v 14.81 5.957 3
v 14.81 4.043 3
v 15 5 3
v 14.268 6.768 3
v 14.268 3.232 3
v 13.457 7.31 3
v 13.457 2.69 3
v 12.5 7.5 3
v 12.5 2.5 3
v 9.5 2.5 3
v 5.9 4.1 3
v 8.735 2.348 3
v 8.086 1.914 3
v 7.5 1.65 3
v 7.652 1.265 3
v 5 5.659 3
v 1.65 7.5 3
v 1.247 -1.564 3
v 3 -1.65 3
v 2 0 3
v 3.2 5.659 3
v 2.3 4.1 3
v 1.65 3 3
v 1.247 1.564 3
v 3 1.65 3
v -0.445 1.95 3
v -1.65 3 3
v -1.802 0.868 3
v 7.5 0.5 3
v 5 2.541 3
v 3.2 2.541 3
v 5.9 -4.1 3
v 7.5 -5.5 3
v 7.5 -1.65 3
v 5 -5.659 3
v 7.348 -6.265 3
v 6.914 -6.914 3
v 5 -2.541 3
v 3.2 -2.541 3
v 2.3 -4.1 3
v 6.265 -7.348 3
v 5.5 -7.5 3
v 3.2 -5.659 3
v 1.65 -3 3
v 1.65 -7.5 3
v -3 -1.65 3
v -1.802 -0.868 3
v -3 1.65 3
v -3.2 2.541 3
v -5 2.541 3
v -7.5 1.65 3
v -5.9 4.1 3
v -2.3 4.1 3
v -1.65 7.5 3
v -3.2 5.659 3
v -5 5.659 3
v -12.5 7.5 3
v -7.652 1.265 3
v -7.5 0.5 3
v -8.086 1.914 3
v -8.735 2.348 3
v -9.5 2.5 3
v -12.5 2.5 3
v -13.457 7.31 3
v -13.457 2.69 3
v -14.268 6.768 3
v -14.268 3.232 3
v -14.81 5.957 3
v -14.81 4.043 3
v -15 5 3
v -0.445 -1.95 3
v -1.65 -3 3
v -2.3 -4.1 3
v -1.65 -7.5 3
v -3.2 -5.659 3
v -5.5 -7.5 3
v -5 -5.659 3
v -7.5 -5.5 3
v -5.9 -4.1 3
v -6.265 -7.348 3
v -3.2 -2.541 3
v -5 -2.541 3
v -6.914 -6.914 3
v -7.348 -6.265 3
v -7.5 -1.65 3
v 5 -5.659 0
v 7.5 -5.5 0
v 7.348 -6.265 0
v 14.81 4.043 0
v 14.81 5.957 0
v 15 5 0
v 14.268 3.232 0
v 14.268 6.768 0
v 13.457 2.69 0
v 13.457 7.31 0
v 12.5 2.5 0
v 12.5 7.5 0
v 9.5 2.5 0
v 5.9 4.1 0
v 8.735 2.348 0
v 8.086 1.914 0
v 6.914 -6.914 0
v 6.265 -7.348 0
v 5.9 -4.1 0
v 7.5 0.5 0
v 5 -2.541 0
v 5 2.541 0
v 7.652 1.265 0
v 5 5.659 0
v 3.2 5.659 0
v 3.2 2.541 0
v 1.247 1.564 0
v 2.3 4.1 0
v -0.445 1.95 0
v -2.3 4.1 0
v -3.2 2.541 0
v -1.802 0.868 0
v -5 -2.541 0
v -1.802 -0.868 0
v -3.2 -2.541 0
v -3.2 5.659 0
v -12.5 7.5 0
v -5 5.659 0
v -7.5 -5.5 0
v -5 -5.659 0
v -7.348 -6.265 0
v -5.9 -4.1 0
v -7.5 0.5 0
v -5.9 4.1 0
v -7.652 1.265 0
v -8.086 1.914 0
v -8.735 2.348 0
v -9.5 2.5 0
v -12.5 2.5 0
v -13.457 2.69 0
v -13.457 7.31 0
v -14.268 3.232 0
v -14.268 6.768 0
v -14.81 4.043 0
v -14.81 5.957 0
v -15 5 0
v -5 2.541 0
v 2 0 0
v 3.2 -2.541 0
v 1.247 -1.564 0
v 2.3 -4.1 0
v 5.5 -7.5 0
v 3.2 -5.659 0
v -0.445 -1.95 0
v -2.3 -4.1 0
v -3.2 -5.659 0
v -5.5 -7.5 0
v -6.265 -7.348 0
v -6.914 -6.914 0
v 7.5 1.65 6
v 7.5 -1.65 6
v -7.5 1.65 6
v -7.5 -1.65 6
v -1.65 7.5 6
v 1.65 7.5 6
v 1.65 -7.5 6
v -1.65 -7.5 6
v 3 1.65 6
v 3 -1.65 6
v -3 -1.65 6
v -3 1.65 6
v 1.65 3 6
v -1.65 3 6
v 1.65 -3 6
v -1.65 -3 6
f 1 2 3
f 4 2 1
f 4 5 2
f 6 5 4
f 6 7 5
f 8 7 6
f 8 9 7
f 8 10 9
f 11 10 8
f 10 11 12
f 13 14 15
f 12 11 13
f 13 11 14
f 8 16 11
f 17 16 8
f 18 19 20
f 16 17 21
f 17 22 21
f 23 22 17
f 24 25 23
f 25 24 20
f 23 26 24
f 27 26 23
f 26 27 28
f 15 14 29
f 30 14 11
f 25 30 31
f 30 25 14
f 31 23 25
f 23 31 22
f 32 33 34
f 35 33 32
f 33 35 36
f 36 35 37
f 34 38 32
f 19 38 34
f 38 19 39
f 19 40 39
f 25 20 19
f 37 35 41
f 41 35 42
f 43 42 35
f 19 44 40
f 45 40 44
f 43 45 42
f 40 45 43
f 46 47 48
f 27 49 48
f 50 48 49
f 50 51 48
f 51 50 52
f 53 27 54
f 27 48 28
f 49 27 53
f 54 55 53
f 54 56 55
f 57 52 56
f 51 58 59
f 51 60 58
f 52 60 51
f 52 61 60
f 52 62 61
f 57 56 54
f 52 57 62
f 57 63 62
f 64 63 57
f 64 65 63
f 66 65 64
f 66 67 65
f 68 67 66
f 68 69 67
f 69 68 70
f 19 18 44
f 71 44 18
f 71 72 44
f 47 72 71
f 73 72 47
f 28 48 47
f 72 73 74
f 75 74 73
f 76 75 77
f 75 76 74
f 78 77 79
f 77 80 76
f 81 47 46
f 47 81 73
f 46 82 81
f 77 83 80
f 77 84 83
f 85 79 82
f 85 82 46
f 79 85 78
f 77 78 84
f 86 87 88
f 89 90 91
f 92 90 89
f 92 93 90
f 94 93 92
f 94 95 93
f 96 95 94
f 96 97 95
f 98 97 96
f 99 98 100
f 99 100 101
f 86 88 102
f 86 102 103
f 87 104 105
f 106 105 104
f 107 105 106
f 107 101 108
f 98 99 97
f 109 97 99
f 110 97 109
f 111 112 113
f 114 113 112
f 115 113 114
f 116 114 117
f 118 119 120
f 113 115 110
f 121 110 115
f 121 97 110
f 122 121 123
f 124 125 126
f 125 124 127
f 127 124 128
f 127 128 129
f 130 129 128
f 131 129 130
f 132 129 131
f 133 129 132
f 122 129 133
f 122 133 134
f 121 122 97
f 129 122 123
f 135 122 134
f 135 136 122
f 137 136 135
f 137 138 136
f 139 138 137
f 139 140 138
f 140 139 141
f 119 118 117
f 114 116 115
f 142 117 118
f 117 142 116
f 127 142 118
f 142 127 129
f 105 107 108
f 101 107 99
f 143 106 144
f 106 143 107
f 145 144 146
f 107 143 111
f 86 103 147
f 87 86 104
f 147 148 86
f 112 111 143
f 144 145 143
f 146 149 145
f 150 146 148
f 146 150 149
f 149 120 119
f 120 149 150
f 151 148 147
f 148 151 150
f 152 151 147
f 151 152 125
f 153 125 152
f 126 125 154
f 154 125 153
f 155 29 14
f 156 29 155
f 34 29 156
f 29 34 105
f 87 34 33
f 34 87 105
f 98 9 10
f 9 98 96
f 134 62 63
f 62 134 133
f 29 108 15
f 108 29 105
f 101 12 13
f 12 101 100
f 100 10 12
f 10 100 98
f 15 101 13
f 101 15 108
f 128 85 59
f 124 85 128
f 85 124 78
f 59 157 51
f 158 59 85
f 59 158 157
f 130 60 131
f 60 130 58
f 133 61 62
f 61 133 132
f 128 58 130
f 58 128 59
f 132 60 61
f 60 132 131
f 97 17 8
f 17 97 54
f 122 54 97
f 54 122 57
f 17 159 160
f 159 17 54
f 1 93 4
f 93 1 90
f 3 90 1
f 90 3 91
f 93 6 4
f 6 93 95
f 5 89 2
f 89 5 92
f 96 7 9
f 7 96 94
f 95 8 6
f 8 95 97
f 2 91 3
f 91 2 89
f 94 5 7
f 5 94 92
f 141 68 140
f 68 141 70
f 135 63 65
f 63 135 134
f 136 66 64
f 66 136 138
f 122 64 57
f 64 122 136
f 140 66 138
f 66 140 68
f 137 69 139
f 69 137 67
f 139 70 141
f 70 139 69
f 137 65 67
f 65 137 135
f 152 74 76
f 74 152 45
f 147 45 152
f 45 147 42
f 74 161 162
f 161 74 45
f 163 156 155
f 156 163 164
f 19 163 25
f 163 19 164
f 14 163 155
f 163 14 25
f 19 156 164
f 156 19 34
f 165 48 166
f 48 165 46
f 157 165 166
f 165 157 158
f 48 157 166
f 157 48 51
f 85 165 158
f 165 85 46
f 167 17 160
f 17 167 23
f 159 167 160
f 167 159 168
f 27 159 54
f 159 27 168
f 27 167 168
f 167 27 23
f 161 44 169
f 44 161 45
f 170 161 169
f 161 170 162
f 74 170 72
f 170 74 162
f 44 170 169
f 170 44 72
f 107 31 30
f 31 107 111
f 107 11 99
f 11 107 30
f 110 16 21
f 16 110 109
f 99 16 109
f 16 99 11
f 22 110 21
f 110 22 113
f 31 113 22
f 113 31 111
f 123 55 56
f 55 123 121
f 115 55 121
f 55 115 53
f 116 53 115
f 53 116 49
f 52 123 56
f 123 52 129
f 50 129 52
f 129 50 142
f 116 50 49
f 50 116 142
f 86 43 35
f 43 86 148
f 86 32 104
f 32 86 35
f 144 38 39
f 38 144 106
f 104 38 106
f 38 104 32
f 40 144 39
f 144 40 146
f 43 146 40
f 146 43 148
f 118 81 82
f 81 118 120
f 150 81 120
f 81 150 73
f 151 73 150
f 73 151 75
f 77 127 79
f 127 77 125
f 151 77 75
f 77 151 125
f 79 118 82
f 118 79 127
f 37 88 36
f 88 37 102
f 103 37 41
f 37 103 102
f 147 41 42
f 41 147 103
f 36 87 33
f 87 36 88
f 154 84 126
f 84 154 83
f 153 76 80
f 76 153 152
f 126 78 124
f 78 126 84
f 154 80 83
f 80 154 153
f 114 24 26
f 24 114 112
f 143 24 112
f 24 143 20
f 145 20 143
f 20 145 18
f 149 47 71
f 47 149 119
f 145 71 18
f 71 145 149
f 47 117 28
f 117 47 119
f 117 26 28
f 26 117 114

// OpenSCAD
//CUSTOMIZER VARIABLES

/* [Basic_Parameters] */

// end cap thickness, in mm
end_depth = 3.0;    // [1:0.1:10]

// slot tab depth, in mm
tab_length = 3.0;    // [2:0.1:20]

// foot length (can be zero), in mm
foot_length = 5.0;    // [0:1:20]

// foot height, in mm
foot_height = 5.0;    // [2:0.5:20]

// Bolt diameter (can be zero), in mm
bolt_diameter = 3.0;    // [0:0.1:20]

// fillet radius, in mm
fillet_radius = 2.0;    // [1:0.1:20]

// hole radius (can be zero), in mm
hole_radius = 1.8;    // [0:0.1:20]

// Openbeam slot diameter for tight fit, in mm
slot_diameter = 3.3;    // [2:0.1:20]

// Openbeam slot distance to edge for tight fit, in mm
tab_height = 4.5;    // [2:0.1:20]

// Openbeam size, in mm
openrail_size = 15;   // [10:50]

//CUSTOMIZER VARIABLES END


// Sanity checks
if( end_depth <= 0 || tab_length <= 0
    || openrail_size <= 0 || slot_diameter <= 0)
{
    echo("<B>Error: Missing important parameters</B>");
}


// z depth
main_depth= end_depth;
fillet_size= fillet_radius;


// our object, translated to be flat on xy plane for easy STL generation
translate([0,0,main_depth/2])
    end_cap();

module end_cap(){

    main_width= openrail_size;
    main_height= openrail_size;
    bolt_length= main_depth+tab_length+5;

    difference() {
      union() {
 
        // the main block
        cube([main_width,main_height,main_depth],center = true);

        // tabs to grip the rail
        tab_dist= main_width/2 - tab_height/2;
        tab_offset= main_depth/2 + tab_length/2;
        translate([tab_dist,0,tab_offset])
          cube([tab_height,slot_diameter,tab_length], center = true);
        translate([-tab_dist,0,tab_offset])
          cube([tab_height,slot_diameter,tab_length], center = true);
        translate([0,tab_dist,tab_offset])
          cube([slot_diameter,tab_height,tab_length], center = true);
        translate([0,-tab_dist,tab_offset])
          cube([slot_diameter,tab_height,tab_length], center = true);
 
        // side pieces to help stabilize the rail on a table
        if (foot_length > 0 && foot_height > 0) {
            translate([0,(main_height-foot_height)/2,0])
              cube([main_width+2*foot_length,foot_height,main_depth], center = true);
            translate([(main_width/2+foot_length),(main_height-foot_height)/2,-main_depth/2])
              cylinder(main_depth,foot_height/2,foot_height/2,$fn=16);
            translate([-(main_width/2+foot_length),(main_height-foot_height)/2,-main_depth/2])
              cylinder(main_depth,foot_height/2,foot_height/2,$fn=16);
              
            // hacky fillet for strength of foot joint
            difference() {
              translate([main_width/2+fillet_size/2,main_height/2-foot_height-fillet_size/2,0])
                cube([fillet_size,fillet_size,main_depth],center = true);
              translate([main_width/2+fillet_size,main_height/2-foot_height-fillet_size,-main_depth/2-1])
                cylinder(main_depth+2,fillet_size,fillet_size,$fn=16);
            }
            difference() {
              translate([-(main_width/2+fillet_size/2),main_height/2-foot_height-fillet_size/2,0])
                cube([fillet_size,fillet_size,main_depth],center = true);
              translate([-(main_width/2+fillet_size),main_height/2-foot_height-fillet_size,-main_depth/2-1])
                cylinder(main_depth+2,fillet_size,fillet_size,$fn=16);
            }
         }
      }

    // optional holes to reduce material usage, allow a little more give on tabs
    if (hole_radius > 0) {
       hole_offset = main_width/3 - hole_radius/2;
       translate([hole_offset,hole_offset,-3])
         cylinder(bolt_length,hole_radius,hole_radius);
       translate([-hole_offset,hole_offset,-3])
         cylinder(bolt_length,hole_radius,hole_radius);
       translate([hole_offset,-hole_offset,-3])
         cylinder(bolt_length,hole_radius,hole_radius);
       translate([-hole_offset,-hole_offset,-3])
         cylinder(bolt_length,hole_radius,hole_radius);
    }

    // hacky fillet to remove sharp corners from top
    corner_x= main_width/2-fillet_size/2;
    corner_y=main_height/2-fillet_size/2;
    cyl_x= main_width/2-fillet_size;
    cyl_y= main_height/2-fillet_size;
    difference() {
      translate([corner_x,-corner_y,0])
        cube([fillet_size,fillet_size,main_depth],center = true);
      translate([cyl_x,-cyl_y,-main_depth/2])
        cylinder(main_depth,fillet_size,fillet_size,$fn=16);
    }
    difference() {
      translate([-corner_x,-corner_y,0])
        cube([fillet_size,fillet_size,main_depth],center = true);
      translate([-cyl_x,-cyl_y,-main_depth/2])
        cylinder(main_depth,fillet_size,fillet_size,$fn=16);
    }
    
    // if no foot, then fillet all 4 corners
   if (foot_length <= 0 || foot_height < 0) {
        difference() {
          translate([corner_x,corner_y,0])
            cube([fillet_size,fillet_size,main_depth],center = true);
          translate([cyl_x,cyl_y,-main_depth/2])
            cylinder(main_depth,fillet_size,fillet_size,$fn=16);
        }
        difference() {
          translate([-corner_x,corner_y,0])
            cube([fillet_size,fillet_size,main_depth],center = true);
          translate([-cyl_x,cyl_y,-main_depth/2])
            cylinder(main_depth,fillet_size,fillet_size,$fn=16);
        }
   }

    // optional hole in center for bolt, also reduces material use
    if (bolt_diameter > 0) {
       bolt_rad= (bolt_diameter+1)/2;
       translate([0,0,-3])
         cylinder(bolt_length,bolt_rad,bolt_rad);
    }
  }

}
